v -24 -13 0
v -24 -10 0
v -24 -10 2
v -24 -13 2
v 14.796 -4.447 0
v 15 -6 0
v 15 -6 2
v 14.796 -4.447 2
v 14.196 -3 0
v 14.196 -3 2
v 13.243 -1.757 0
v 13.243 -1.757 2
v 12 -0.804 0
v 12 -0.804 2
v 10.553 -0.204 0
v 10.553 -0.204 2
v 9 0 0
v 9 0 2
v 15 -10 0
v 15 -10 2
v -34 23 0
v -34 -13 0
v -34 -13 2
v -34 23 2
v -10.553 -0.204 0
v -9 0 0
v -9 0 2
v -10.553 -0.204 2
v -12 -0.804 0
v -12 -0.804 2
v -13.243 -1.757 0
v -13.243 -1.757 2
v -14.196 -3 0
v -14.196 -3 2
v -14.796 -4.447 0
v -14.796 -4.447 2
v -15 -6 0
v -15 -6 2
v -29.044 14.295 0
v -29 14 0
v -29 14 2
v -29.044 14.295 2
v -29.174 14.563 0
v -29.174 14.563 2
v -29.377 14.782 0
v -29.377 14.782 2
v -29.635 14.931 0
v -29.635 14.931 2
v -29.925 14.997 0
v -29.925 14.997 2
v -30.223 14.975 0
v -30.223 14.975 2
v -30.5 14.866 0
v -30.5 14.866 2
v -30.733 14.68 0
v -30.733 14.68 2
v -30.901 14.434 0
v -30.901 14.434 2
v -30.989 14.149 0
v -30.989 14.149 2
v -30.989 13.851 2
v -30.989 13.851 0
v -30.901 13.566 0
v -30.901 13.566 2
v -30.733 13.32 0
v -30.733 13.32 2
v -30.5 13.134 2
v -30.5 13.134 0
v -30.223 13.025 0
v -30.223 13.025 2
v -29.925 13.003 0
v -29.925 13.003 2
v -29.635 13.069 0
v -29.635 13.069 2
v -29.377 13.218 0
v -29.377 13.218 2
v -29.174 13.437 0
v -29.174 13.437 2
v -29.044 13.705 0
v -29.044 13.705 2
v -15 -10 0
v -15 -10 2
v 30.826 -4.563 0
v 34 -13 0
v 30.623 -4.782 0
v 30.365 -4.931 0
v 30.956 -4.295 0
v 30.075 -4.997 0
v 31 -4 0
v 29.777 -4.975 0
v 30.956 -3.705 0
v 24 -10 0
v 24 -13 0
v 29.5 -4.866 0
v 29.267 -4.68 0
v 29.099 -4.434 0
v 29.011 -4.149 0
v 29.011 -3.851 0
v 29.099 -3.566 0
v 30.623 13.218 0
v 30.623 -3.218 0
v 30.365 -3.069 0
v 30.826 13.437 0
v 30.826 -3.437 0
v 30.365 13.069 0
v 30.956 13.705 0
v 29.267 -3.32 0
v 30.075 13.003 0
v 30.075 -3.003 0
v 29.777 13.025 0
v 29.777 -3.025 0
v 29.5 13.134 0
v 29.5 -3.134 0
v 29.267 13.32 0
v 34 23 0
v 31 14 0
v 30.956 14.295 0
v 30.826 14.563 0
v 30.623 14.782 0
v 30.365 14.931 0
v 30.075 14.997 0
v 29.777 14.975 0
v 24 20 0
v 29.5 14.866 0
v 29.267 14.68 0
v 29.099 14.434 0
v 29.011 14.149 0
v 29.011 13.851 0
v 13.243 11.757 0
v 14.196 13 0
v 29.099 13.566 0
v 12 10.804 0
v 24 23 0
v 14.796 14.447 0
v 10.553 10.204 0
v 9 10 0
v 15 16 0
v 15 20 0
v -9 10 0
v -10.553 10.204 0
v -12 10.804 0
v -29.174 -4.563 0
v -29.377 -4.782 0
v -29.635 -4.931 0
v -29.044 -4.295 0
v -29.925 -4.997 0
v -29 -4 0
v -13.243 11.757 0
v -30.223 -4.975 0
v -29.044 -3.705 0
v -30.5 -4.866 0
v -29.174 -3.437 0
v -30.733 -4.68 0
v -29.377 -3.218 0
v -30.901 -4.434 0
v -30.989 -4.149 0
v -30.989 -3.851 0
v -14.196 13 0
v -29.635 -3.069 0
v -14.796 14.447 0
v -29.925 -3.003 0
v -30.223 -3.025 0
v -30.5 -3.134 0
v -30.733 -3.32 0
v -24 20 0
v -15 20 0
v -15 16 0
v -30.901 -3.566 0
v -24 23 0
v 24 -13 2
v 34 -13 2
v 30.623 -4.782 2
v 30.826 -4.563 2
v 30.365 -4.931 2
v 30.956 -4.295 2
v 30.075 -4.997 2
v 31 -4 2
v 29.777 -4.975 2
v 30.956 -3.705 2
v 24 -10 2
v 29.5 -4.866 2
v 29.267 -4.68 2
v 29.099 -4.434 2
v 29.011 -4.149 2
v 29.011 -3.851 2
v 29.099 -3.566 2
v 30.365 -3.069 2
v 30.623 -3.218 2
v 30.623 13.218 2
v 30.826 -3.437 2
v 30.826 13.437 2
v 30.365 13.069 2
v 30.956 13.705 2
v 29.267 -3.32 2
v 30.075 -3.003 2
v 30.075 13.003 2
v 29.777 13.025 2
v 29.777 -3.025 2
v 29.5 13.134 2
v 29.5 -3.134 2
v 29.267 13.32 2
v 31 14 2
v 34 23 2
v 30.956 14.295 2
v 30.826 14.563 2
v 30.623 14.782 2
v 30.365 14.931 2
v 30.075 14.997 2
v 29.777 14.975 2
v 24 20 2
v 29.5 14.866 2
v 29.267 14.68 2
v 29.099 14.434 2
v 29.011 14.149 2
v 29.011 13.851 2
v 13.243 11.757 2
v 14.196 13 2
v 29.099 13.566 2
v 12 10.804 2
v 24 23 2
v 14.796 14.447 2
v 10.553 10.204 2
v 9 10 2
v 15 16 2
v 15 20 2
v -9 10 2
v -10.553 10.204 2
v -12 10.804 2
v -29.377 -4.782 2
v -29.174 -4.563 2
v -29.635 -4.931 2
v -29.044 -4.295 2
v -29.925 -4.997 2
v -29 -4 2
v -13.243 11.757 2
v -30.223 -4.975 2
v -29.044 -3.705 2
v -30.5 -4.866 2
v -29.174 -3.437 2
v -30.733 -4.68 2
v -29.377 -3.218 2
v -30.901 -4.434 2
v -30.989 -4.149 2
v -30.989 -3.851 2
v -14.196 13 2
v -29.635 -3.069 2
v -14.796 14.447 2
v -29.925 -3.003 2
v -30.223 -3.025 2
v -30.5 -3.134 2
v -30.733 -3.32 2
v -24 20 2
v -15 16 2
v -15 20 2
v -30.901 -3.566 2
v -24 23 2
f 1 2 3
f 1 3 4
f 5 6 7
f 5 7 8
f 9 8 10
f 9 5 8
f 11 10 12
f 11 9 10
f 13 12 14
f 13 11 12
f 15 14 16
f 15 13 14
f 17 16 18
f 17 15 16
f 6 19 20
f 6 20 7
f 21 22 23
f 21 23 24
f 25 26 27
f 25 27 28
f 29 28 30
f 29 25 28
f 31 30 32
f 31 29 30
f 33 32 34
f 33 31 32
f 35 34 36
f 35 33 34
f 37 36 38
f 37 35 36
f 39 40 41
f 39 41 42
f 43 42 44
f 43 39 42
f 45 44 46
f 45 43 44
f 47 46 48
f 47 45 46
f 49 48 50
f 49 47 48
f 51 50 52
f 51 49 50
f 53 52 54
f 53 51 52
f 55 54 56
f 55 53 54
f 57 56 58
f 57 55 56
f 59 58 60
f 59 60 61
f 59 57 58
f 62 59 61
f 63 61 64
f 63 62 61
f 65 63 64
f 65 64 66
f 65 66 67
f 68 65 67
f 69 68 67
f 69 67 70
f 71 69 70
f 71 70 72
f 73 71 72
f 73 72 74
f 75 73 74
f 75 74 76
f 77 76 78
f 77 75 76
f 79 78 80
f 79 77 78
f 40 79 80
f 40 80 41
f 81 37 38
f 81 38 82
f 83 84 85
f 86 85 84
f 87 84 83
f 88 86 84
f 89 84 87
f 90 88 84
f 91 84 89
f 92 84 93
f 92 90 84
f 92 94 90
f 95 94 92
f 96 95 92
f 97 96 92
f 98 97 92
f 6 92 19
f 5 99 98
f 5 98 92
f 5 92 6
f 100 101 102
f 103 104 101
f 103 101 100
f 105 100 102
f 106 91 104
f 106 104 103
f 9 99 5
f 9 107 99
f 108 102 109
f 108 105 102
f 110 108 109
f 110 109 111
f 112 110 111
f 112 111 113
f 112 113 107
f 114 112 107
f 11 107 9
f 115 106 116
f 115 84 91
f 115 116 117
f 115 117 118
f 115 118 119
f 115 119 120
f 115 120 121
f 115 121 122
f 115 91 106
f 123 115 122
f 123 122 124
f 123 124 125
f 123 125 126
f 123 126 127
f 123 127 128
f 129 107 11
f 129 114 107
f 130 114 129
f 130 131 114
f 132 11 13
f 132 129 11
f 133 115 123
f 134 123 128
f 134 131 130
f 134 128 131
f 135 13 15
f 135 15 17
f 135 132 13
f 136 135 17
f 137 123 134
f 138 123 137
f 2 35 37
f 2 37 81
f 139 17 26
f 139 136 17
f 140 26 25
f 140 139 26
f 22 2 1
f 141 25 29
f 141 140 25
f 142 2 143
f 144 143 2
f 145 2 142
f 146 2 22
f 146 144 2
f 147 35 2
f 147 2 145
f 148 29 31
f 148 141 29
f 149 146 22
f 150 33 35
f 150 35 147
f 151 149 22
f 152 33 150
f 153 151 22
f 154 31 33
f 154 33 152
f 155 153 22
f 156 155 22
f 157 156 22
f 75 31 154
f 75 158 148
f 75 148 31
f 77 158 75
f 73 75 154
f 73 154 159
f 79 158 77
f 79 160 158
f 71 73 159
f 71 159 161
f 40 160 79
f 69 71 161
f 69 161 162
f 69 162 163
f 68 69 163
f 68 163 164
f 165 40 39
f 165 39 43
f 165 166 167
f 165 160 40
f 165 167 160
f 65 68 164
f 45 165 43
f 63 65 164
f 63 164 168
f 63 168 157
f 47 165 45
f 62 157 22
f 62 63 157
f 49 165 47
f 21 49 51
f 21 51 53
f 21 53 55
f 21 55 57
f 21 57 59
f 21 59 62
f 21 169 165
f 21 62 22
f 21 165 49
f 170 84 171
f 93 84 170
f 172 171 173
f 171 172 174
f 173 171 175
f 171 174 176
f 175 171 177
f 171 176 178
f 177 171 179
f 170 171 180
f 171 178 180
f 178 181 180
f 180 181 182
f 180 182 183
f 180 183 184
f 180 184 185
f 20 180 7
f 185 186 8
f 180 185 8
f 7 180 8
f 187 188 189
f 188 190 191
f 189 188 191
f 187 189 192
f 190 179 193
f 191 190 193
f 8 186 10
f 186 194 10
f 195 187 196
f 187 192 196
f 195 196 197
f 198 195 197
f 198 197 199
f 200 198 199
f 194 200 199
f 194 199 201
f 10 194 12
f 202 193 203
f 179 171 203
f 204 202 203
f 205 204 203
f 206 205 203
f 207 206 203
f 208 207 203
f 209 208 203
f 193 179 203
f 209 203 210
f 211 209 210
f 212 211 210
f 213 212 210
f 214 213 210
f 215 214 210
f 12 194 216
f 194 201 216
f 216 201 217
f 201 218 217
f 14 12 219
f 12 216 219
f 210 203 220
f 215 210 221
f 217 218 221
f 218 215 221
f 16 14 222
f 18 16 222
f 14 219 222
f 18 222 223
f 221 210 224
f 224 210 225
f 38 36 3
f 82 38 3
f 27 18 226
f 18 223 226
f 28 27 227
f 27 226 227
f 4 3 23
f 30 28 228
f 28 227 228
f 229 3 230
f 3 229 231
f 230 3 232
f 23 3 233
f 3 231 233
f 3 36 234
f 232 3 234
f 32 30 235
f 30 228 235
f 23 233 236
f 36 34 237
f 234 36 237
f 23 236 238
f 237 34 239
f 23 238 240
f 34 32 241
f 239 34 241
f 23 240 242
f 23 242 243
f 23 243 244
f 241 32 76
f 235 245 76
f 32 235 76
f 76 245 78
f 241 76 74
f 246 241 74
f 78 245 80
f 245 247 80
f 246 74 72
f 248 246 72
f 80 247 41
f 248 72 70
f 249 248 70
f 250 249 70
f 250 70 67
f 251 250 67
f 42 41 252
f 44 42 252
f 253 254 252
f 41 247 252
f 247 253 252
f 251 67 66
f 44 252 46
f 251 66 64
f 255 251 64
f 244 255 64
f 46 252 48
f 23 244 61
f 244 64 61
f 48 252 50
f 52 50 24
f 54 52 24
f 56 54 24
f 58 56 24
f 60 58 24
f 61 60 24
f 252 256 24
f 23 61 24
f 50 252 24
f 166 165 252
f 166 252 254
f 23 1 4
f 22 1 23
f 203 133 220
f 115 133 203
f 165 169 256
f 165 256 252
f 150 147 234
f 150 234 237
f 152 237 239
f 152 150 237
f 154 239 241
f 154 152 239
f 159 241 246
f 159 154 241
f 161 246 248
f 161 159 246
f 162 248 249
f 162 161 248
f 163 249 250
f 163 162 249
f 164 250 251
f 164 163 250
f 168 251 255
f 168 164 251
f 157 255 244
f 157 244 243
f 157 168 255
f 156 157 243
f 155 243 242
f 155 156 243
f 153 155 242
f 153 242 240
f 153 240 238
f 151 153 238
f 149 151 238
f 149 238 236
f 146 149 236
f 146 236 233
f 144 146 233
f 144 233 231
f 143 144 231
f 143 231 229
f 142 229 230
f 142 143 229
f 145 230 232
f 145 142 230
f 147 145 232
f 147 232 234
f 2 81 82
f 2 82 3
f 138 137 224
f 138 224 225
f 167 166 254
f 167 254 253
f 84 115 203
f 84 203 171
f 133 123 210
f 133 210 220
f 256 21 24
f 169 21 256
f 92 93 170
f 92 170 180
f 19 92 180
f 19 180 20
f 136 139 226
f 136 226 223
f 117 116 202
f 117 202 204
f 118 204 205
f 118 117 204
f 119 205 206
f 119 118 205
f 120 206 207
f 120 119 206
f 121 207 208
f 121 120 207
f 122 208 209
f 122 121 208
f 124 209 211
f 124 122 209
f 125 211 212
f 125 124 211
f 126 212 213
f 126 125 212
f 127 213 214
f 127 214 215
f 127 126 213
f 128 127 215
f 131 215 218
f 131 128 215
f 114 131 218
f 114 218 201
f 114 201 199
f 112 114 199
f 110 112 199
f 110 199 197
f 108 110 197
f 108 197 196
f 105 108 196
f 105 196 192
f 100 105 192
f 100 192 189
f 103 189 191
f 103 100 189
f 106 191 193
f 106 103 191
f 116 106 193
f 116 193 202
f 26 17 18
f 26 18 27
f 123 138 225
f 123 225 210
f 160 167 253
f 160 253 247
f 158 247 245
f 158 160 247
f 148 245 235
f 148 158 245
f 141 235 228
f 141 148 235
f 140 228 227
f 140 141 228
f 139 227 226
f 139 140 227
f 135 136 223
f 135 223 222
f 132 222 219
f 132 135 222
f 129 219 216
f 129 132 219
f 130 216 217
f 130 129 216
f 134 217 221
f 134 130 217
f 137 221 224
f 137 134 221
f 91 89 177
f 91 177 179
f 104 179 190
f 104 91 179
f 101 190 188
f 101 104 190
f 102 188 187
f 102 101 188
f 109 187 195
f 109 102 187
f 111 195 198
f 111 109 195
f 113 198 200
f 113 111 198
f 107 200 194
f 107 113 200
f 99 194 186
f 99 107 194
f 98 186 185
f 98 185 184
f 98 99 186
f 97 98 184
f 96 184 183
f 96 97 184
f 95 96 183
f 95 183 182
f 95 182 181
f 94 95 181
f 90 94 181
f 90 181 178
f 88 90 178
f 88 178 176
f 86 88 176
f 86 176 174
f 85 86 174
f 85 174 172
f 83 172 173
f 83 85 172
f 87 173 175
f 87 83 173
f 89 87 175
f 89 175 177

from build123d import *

# Parameters (mm, degrees)
MODEL_R         = 1
EXTRUDE_1_DEPTH = 2


with BuildPart() as part:
    # Model → Бобышка-Вытянуть1 (new body)
    with BuildSketch(Plane.XY):
        with BuildLine():
            Line((15, 20), (24, 20))
            Line((24, 20), (24, 23))
            Line((24, 23), (34, 23))
            Line((34, 23), (34, -13))
            Line((34, -13), (24, -13))
            Line((24, -13), (24, -10))
            Line((24, -10), (15, -10))
            Line((15, -10), (15, -6))
            ThreePointArc((15, -6), (13.242640687, -1.757359313), (9, 0))
            Line((9, 0), (-9, 0))
            ThreePointArc((-9, 0), (-13.242640687, -1.757359313), (-15, -6))
            Line((-15, -6), (-15, -10))
            Line((-15, -10), (-24, -10))
            Line((-24, -10), (-24, -13))
            Line((-24, -13), (-34, -13))
            Line((-34, -13), (-34, 23))
            Line((-34, 23), (-24, 23))
            Line((-24, 23), (-24, 20))
            Line((-24, 20), (-15, 20))
            Line((-15, 20), (-15, 16))
            ThreePointArc((-15, 16), (-13.242640687, 11.757359313), (-9, 10))
            Line((-9, 10), (9, 10))
            ThreePointArc((9, 10), (13.242640687, 11.757359313), (15, 16))
            Line((15, 16), (15, 20))
        make_face()
        with Locations((30, -4)):
            Circle(MODEL_R, mode=Mode.SUBTRACT)
        with Locations((30, 14)):
            Circle(MODEL_R, mode=Mode.SUBTRACT)
        with Locations((-30, 14)):
            Circle(MODEL_R, mode=Mode.SUBTRACT)
        with Locations((-30, -4)):
            Circle(MODEL_R, mode=Mode.SUBTRACT)
    extrude(amount=EXTRUDE_1_DEPTH)


solid = part.part
